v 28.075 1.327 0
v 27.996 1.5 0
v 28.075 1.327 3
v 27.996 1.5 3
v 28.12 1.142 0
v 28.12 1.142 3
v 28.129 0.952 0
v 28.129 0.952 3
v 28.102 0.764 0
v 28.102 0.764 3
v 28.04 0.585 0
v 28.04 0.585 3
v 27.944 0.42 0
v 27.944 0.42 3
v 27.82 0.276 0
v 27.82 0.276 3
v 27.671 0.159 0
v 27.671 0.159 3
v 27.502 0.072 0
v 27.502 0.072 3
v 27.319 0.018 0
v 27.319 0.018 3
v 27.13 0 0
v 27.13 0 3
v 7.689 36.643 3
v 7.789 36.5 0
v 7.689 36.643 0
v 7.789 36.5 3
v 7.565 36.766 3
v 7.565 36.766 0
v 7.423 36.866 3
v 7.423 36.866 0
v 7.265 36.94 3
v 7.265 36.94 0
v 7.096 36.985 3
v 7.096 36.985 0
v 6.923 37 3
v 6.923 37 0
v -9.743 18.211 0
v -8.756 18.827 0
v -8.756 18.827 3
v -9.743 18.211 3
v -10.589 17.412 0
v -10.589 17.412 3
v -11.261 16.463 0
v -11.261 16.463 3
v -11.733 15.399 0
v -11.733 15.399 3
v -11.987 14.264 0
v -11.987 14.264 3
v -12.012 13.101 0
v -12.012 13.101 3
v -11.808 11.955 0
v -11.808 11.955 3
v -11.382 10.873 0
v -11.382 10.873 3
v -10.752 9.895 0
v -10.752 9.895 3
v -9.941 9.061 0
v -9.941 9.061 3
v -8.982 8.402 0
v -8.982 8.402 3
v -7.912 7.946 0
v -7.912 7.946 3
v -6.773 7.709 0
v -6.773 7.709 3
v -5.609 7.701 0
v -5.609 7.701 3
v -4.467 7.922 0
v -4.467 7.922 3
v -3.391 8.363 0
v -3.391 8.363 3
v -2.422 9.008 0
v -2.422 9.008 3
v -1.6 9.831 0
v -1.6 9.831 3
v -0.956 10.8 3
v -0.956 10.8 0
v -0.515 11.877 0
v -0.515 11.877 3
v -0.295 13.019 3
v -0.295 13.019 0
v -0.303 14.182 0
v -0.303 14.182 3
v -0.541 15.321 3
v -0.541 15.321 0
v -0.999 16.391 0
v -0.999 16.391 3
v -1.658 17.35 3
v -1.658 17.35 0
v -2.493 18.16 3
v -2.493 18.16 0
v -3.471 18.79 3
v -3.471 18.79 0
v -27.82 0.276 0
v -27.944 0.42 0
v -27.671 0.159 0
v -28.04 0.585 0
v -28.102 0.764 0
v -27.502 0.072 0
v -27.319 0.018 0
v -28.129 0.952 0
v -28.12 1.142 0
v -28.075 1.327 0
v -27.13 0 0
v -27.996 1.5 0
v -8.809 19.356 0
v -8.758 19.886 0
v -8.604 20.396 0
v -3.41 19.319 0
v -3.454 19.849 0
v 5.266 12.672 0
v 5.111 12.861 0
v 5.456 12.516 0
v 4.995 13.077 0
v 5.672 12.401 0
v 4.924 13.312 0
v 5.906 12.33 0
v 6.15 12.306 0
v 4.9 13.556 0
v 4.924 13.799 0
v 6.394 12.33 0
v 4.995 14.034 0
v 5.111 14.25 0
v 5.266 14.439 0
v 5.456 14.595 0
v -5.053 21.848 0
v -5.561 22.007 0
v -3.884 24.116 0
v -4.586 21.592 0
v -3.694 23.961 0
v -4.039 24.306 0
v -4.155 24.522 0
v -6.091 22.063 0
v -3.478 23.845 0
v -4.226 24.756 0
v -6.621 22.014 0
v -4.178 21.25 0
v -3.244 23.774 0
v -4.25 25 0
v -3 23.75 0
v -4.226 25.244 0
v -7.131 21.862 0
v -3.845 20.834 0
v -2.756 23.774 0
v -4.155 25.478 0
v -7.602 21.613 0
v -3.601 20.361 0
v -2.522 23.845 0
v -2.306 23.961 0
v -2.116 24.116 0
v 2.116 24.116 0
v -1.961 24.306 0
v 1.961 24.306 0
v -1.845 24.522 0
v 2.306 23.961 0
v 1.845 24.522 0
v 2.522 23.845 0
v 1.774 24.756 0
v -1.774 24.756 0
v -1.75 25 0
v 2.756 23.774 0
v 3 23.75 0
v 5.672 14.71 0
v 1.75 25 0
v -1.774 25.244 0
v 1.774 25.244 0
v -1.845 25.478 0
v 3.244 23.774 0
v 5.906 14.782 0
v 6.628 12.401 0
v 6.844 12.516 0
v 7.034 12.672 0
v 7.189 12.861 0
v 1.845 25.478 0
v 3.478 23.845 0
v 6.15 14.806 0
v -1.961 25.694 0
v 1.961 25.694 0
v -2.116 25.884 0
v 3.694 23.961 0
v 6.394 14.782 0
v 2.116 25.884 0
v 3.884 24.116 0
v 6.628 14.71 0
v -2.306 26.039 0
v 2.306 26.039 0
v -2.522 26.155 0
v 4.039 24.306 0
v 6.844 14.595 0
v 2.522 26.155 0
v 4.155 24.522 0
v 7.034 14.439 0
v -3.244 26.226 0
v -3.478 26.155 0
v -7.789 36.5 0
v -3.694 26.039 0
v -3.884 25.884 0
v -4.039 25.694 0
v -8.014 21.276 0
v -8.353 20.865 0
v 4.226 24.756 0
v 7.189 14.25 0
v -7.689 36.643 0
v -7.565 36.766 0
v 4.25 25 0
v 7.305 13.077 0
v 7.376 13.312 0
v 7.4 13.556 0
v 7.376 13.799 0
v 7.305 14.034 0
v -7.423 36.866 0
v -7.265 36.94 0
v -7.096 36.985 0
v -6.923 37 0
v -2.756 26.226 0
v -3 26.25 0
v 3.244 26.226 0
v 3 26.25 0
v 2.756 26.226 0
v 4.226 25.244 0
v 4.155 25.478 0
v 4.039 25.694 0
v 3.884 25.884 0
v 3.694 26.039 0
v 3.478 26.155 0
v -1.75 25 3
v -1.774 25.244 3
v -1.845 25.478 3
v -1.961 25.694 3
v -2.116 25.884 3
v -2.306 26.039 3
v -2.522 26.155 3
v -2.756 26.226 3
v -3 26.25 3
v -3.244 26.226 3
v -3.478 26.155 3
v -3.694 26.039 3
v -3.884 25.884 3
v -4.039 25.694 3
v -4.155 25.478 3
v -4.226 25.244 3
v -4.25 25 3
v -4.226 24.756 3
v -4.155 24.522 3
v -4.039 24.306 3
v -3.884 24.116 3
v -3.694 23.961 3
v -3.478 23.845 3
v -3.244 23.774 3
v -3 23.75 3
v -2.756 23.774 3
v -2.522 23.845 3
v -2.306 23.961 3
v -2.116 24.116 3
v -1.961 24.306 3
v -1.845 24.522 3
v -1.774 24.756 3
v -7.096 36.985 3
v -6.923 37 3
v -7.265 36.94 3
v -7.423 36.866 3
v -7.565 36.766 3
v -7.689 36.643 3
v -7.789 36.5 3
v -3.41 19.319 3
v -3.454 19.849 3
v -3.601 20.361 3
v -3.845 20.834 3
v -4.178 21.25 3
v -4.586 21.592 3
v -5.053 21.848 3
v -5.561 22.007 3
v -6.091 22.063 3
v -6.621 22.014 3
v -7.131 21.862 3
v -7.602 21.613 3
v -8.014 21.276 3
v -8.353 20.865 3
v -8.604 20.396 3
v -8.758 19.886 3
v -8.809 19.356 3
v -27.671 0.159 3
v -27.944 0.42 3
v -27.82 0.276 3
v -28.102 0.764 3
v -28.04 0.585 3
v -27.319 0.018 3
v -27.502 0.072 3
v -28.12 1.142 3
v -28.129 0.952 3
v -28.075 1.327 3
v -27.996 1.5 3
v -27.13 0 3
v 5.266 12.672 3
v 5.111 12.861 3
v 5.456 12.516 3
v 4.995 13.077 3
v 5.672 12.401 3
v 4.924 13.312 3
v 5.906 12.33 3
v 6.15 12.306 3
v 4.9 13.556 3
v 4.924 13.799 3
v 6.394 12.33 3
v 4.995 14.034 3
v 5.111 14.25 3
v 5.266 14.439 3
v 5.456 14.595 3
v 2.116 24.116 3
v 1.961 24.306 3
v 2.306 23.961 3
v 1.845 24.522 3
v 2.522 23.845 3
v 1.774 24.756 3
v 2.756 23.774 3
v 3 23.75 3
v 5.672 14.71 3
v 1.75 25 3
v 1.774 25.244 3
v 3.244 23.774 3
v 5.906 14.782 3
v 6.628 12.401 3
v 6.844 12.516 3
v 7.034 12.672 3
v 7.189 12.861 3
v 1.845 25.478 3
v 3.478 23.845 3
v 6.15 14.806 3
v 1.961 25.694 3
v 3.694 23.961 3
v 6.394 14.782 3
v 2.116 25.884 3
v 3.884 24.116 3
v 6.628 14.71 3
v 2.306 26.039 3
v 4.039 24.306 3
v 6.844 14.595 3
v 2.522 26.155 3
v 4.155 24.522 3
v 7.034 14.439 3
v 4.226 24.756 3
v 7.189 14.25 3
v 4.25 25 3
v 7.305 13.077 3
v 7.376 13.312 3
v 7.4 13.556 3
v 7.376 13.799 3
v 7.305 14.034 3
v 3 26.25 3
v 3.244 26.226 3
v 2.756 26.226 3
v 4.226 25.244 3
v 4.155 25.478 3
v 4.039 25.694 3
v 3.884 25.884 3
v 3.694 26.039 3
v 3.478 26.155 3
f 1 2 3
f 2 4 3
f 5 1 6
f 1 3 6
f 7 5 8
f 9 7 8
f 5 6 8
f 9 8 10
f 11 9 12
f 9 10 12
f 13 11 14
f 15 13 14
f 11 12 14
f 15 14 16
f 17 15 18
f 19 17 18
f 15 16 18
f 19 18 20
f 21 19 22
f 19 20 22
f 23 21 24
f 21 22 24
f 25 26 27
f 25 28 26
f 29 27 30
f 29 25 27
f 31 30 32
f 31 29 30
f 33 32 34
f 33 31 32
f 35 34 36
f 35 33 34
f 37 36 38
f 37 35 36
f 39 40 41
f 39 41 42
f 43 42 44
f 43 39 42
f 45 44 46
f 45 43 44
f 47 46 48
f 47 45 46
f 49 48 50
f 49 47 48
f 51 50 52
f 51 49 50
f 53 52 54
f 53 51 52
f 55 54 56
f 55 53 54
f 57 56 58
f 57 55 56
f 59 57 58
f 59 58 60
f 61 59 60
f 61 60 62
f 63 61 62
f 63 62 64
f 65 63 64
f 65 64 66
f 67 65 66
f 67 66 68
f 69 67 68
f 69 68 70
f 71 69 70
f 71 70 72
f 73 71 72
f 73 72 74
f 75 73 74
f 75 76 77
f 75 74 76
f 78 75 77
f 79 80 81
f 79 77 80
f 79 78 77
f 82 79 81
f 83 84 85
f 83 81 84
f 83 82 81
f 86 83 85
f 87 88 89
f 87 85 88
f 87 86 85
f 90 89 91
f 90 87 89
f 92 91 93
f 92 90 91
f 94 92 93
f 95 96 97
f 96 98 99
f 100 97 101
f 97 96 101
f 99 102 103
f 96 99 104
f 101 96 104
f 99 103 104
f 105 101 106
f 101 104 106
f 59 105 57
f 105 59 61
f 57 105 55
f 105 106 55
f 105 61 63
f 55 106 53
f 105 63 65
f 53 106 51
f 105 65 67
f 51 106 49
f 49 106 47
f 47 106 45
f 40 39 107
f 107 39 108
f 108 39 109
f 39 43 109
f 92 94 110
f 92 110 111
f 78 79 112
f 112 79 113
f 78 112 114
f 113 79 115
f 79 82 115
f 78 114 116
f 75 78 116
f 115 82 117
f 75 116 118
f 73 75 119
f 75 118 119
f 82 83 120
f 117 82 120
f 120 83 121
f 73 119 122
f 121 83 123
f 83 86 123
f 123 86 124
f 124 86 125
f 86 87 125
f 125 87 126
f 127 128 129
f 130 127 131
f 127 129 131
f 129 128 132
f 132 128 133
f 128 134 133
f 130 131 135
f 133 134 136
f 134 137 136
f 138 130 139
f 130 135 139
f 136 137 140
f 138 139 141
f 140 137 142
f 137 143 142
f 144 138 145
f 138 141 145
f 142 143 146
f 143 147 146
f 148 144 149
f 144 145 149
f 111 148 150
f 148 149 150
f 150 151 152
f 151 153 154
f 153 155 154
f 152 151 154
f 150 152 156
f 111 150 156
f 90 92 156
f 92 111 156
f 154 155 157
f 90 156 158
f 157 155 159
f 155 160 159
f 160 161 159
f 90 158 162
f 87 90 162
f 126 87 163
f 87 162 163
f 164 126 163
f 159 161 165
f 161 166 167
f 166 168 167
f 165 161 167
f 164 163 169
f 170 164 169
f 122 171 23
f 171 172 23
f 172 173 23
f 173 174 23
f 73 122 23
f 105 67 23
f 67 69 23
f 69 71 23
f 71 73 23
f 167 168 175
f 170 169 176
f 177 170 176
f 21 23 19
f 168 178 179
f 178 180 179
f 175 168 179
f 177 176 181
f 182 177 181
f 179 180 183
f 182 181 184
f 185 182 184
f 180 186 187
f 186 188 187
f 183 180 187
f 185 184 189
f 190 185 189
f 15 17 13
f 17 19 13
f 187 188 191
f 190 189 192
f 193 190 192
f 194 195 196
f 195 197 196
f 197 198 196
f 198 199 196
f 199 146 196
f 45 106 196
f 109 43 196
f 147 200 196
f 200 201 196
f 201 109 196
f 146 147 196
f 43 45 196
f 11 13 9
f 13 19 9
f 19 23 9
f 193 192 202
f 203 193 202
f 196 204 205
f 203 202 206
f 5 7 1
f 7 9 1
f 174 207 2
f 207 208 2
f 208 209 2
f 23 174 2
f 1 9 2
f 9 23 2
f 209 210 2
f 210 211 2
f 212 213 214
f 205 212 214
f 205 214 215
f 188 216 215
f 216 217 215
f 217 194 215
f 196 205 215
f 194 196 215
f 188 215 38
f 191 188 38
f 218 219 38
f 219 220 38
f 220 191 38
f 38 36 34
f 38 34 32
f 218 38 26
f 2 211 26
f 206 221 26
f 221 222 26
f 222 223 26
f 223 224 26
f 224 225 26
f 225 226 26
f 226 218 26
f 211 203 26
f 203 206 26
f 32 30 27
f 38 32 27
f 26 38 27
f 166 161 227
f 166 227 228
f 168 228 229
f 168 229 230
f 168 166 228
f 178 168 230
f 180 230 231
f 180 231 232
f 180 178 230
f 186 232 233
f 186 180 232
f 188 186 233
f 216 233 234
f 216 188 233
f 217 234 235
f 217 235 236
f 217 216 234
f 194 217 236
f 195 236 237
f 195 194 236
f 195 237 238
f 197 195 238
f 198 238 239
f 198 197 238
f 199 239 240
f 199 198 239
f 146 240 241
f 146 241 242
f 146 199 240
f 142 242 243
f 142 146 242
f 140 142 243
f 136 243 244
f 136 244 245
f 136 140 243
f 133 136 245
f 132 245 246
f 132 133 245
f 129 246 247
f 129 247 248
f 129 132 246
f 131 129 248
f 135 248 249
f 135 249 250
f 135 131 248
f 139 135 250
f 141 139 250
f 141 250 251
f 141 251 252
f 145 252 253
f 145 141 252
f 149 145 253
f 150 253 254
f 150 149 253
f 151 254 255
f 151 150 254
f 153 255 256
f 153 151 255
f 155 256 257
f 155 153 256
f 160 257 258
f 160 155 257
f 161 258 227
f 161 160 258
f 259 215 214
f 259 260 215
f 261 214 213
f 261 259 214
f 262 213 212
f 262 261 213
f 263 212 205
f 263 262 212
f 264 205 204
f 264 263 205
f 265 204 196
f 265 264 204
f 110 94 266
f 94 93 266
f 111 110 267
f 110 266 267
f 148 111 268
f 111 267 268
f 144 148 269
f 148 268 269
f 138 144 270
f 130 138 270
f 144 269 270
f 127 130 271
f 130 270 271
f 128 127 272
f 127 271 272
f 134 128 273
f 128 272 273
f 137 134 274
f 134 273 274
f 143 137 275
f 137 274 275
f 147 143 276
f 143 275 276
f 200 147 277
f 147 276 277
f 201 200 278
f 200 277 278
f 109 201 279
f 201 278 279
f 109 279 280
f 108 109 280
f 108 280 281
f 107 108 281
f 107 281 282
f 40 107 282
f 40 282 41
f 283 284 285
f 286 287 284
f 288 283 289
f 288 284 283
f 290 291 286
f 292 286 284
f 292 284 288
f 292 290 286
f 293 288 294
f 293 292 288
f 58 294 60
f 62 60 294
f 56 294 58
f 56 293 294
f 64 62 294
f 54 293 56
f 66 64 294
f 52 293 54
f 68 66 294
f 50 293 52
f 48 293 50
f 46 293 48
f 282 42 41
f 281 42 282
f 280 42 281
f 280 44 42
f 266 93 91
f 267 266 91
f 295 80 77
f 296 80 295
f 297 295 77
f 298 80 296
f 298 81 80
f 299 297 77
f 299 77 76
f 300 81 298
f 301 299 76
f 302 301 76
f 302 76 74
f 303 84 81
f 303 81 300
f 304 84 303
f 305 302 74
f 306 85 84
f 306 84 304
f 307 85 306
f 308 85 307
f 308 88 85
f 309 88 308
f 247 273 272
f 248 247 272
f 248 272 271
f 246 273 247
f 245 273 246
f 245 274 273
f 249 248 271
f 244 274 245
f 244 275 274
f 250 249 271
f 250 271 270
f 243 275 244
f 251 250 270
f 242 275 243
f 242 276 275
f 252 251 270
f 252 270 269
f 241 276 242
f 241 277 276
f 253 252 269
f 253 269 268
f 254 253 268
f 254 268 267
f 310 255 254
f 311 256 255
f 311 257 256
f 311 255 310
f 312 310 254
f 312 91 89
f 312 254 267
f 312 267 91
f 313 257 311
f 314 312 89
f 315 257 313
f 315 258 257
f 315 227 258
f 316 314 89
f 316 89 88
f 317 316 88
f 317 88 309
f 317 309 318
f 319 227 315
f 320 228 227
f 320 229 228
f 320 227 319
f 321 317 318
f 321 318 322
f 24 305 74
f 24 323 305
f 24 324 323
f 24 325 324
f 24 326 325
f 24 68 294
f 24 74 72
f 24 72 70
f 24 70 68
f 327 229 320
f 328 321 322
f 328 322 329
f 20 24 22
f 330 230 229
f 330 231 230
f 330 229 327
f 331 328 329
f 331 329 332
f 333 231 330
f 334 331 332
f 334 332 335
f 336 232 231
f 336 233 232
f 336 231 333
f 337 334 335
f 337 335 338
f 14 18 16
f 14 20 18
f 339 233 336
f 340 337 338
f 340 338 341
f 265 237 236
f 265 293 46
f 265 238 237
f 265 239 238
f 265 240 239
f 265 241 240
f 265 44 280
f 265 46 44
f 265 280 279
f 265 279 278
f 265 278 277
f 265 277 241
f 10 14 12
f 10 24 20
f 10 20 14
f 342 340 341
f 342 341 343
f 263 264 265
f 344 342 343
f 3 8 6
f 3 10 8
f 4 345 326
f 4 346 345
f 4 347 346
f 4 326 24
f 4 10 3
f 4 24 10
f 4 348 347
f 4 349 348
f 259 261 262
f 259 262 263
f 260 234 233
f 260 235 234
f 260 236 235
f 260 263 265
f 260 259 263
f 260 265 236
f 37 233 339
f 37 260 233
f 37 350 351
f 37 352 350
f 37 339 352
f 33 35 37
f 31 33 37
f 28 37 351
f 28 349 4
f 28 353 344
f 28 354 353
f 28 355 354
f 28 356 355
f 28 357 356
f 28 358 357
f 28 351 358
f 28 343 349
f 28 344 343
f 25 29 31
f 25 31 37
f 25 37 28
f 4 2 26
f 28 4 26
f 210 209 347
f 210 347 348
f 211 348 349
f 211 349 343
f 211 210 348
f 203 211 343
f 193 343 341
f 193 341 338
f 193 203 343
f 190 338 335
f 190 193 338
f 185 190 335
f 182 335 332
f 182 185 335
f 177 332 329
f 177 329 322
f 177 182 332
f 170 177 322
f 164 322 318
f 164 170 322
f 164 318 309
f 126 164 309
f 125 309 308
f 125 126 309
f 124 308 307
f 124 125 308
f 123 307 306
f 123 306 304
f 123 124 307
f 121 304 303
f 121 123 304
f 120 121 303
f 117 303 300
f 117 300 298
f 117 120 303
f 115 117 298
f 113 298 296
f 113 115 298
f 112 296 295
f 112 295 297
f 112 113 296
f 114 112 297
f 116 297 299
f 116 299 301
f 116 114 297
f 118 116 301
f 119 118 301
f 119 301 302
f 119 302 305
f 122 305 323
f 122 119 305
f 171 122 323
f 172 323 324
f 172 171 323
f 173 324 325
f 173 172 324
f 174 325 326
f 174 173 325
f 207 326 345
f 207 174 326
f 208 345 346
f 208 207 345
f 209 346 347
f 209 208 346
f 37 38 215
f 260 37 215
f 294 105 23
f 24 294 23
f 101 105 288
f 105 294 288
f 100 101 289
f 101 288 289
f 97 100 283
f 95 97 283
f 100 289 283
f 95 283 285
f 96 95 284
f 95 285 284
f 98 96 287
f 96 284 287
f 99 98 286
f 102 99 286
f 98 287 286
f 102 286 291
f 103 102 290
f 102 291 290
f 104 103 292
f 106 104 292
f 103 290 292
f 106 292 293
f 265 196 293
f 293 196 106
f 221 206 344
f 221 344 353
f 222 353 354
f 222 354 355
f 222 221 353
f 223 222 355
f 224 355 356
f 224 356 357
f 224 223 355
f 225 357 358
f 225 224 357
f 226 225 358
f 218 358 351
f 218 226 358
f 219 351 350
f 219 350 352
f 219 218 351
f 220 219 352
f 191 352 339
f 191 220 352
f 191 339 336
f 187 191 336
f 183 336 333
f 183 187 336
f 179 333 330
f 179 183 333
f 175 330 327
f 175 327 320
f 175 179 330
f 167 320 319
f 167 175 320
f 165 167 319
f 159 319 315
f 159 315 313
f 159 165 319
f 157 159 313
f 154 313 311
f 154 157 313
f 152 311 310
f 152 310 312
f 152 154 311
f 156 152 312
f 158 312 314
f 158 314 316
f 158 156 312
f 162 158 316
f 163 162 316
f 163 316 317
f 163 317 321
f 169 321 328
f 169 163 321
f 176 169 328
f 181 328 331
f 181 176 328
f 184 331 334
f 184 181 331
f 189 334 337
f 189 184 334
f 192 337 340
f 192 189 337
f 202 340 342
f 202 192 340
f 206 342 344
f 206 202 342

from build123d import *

# Parameters (mm, degrees)
SKETCH001_R      = 2.7
EXTRUDE001_DEPTH = 10
SKETCH_R         = 1.25
SKETCH_R_2       = 5.88
EXTRUDE_DEPTH    = 3
FILLET_R         = 1


with BuildPart() as extrude001:
    # Sketch001 (on Face5 of Fillet) → Extrude001 (new body)
    with BuildSketch(Plane.XY.offset(3)):
        with Locations((-6.109428, 19.36281)):
            Circle(SKETCH001_R)
    extrude(amount=-EXTRUDE001_DEPTH)


with BuildPart() as cut:
    # Sketch → Extrude (new body)
    with BuildSketch(Plane.XY):
        Polygon((0, 0), (28.86196, 0), (7.5, 37), (-7.5, 37), (-28.86196, 0), align=None)
        with Locations((-3, 25)):
            Circle(SKETCH_R, mode=Mode.SUBTRACT)
        with Locations((3, 25)):
            Circle(SKETCH_R, mode=Mode.SUBTRACT)
        with Locations((-6.15, 13.555595)):
            Circle(SKETCH_R_2, mode=Mode.SUBTRACT)
        with Locations((6.15, 13.555595)):
            Circle(SKETCH_R, mode=Mode.SUBTRACT)
    extrude(amount=EXTRUDE_DEPTH)

    # Fillet
    fillet_edges = [cut.edges().sort_by_distance(p)[0] for p in [
        (28.86196, 0, 1.5),
        (7.5, 37, 1.5),
        (-7.5, 37, 1.5),
        (-28.86196, 0, 1.5),
    ]]
    fillet(fillet_edges, radius=FILLET_R)

    # Cut: cut Extrude001
    add(extrude001.part, mode=Mode.SUBTRACT)


solid = cut.part
